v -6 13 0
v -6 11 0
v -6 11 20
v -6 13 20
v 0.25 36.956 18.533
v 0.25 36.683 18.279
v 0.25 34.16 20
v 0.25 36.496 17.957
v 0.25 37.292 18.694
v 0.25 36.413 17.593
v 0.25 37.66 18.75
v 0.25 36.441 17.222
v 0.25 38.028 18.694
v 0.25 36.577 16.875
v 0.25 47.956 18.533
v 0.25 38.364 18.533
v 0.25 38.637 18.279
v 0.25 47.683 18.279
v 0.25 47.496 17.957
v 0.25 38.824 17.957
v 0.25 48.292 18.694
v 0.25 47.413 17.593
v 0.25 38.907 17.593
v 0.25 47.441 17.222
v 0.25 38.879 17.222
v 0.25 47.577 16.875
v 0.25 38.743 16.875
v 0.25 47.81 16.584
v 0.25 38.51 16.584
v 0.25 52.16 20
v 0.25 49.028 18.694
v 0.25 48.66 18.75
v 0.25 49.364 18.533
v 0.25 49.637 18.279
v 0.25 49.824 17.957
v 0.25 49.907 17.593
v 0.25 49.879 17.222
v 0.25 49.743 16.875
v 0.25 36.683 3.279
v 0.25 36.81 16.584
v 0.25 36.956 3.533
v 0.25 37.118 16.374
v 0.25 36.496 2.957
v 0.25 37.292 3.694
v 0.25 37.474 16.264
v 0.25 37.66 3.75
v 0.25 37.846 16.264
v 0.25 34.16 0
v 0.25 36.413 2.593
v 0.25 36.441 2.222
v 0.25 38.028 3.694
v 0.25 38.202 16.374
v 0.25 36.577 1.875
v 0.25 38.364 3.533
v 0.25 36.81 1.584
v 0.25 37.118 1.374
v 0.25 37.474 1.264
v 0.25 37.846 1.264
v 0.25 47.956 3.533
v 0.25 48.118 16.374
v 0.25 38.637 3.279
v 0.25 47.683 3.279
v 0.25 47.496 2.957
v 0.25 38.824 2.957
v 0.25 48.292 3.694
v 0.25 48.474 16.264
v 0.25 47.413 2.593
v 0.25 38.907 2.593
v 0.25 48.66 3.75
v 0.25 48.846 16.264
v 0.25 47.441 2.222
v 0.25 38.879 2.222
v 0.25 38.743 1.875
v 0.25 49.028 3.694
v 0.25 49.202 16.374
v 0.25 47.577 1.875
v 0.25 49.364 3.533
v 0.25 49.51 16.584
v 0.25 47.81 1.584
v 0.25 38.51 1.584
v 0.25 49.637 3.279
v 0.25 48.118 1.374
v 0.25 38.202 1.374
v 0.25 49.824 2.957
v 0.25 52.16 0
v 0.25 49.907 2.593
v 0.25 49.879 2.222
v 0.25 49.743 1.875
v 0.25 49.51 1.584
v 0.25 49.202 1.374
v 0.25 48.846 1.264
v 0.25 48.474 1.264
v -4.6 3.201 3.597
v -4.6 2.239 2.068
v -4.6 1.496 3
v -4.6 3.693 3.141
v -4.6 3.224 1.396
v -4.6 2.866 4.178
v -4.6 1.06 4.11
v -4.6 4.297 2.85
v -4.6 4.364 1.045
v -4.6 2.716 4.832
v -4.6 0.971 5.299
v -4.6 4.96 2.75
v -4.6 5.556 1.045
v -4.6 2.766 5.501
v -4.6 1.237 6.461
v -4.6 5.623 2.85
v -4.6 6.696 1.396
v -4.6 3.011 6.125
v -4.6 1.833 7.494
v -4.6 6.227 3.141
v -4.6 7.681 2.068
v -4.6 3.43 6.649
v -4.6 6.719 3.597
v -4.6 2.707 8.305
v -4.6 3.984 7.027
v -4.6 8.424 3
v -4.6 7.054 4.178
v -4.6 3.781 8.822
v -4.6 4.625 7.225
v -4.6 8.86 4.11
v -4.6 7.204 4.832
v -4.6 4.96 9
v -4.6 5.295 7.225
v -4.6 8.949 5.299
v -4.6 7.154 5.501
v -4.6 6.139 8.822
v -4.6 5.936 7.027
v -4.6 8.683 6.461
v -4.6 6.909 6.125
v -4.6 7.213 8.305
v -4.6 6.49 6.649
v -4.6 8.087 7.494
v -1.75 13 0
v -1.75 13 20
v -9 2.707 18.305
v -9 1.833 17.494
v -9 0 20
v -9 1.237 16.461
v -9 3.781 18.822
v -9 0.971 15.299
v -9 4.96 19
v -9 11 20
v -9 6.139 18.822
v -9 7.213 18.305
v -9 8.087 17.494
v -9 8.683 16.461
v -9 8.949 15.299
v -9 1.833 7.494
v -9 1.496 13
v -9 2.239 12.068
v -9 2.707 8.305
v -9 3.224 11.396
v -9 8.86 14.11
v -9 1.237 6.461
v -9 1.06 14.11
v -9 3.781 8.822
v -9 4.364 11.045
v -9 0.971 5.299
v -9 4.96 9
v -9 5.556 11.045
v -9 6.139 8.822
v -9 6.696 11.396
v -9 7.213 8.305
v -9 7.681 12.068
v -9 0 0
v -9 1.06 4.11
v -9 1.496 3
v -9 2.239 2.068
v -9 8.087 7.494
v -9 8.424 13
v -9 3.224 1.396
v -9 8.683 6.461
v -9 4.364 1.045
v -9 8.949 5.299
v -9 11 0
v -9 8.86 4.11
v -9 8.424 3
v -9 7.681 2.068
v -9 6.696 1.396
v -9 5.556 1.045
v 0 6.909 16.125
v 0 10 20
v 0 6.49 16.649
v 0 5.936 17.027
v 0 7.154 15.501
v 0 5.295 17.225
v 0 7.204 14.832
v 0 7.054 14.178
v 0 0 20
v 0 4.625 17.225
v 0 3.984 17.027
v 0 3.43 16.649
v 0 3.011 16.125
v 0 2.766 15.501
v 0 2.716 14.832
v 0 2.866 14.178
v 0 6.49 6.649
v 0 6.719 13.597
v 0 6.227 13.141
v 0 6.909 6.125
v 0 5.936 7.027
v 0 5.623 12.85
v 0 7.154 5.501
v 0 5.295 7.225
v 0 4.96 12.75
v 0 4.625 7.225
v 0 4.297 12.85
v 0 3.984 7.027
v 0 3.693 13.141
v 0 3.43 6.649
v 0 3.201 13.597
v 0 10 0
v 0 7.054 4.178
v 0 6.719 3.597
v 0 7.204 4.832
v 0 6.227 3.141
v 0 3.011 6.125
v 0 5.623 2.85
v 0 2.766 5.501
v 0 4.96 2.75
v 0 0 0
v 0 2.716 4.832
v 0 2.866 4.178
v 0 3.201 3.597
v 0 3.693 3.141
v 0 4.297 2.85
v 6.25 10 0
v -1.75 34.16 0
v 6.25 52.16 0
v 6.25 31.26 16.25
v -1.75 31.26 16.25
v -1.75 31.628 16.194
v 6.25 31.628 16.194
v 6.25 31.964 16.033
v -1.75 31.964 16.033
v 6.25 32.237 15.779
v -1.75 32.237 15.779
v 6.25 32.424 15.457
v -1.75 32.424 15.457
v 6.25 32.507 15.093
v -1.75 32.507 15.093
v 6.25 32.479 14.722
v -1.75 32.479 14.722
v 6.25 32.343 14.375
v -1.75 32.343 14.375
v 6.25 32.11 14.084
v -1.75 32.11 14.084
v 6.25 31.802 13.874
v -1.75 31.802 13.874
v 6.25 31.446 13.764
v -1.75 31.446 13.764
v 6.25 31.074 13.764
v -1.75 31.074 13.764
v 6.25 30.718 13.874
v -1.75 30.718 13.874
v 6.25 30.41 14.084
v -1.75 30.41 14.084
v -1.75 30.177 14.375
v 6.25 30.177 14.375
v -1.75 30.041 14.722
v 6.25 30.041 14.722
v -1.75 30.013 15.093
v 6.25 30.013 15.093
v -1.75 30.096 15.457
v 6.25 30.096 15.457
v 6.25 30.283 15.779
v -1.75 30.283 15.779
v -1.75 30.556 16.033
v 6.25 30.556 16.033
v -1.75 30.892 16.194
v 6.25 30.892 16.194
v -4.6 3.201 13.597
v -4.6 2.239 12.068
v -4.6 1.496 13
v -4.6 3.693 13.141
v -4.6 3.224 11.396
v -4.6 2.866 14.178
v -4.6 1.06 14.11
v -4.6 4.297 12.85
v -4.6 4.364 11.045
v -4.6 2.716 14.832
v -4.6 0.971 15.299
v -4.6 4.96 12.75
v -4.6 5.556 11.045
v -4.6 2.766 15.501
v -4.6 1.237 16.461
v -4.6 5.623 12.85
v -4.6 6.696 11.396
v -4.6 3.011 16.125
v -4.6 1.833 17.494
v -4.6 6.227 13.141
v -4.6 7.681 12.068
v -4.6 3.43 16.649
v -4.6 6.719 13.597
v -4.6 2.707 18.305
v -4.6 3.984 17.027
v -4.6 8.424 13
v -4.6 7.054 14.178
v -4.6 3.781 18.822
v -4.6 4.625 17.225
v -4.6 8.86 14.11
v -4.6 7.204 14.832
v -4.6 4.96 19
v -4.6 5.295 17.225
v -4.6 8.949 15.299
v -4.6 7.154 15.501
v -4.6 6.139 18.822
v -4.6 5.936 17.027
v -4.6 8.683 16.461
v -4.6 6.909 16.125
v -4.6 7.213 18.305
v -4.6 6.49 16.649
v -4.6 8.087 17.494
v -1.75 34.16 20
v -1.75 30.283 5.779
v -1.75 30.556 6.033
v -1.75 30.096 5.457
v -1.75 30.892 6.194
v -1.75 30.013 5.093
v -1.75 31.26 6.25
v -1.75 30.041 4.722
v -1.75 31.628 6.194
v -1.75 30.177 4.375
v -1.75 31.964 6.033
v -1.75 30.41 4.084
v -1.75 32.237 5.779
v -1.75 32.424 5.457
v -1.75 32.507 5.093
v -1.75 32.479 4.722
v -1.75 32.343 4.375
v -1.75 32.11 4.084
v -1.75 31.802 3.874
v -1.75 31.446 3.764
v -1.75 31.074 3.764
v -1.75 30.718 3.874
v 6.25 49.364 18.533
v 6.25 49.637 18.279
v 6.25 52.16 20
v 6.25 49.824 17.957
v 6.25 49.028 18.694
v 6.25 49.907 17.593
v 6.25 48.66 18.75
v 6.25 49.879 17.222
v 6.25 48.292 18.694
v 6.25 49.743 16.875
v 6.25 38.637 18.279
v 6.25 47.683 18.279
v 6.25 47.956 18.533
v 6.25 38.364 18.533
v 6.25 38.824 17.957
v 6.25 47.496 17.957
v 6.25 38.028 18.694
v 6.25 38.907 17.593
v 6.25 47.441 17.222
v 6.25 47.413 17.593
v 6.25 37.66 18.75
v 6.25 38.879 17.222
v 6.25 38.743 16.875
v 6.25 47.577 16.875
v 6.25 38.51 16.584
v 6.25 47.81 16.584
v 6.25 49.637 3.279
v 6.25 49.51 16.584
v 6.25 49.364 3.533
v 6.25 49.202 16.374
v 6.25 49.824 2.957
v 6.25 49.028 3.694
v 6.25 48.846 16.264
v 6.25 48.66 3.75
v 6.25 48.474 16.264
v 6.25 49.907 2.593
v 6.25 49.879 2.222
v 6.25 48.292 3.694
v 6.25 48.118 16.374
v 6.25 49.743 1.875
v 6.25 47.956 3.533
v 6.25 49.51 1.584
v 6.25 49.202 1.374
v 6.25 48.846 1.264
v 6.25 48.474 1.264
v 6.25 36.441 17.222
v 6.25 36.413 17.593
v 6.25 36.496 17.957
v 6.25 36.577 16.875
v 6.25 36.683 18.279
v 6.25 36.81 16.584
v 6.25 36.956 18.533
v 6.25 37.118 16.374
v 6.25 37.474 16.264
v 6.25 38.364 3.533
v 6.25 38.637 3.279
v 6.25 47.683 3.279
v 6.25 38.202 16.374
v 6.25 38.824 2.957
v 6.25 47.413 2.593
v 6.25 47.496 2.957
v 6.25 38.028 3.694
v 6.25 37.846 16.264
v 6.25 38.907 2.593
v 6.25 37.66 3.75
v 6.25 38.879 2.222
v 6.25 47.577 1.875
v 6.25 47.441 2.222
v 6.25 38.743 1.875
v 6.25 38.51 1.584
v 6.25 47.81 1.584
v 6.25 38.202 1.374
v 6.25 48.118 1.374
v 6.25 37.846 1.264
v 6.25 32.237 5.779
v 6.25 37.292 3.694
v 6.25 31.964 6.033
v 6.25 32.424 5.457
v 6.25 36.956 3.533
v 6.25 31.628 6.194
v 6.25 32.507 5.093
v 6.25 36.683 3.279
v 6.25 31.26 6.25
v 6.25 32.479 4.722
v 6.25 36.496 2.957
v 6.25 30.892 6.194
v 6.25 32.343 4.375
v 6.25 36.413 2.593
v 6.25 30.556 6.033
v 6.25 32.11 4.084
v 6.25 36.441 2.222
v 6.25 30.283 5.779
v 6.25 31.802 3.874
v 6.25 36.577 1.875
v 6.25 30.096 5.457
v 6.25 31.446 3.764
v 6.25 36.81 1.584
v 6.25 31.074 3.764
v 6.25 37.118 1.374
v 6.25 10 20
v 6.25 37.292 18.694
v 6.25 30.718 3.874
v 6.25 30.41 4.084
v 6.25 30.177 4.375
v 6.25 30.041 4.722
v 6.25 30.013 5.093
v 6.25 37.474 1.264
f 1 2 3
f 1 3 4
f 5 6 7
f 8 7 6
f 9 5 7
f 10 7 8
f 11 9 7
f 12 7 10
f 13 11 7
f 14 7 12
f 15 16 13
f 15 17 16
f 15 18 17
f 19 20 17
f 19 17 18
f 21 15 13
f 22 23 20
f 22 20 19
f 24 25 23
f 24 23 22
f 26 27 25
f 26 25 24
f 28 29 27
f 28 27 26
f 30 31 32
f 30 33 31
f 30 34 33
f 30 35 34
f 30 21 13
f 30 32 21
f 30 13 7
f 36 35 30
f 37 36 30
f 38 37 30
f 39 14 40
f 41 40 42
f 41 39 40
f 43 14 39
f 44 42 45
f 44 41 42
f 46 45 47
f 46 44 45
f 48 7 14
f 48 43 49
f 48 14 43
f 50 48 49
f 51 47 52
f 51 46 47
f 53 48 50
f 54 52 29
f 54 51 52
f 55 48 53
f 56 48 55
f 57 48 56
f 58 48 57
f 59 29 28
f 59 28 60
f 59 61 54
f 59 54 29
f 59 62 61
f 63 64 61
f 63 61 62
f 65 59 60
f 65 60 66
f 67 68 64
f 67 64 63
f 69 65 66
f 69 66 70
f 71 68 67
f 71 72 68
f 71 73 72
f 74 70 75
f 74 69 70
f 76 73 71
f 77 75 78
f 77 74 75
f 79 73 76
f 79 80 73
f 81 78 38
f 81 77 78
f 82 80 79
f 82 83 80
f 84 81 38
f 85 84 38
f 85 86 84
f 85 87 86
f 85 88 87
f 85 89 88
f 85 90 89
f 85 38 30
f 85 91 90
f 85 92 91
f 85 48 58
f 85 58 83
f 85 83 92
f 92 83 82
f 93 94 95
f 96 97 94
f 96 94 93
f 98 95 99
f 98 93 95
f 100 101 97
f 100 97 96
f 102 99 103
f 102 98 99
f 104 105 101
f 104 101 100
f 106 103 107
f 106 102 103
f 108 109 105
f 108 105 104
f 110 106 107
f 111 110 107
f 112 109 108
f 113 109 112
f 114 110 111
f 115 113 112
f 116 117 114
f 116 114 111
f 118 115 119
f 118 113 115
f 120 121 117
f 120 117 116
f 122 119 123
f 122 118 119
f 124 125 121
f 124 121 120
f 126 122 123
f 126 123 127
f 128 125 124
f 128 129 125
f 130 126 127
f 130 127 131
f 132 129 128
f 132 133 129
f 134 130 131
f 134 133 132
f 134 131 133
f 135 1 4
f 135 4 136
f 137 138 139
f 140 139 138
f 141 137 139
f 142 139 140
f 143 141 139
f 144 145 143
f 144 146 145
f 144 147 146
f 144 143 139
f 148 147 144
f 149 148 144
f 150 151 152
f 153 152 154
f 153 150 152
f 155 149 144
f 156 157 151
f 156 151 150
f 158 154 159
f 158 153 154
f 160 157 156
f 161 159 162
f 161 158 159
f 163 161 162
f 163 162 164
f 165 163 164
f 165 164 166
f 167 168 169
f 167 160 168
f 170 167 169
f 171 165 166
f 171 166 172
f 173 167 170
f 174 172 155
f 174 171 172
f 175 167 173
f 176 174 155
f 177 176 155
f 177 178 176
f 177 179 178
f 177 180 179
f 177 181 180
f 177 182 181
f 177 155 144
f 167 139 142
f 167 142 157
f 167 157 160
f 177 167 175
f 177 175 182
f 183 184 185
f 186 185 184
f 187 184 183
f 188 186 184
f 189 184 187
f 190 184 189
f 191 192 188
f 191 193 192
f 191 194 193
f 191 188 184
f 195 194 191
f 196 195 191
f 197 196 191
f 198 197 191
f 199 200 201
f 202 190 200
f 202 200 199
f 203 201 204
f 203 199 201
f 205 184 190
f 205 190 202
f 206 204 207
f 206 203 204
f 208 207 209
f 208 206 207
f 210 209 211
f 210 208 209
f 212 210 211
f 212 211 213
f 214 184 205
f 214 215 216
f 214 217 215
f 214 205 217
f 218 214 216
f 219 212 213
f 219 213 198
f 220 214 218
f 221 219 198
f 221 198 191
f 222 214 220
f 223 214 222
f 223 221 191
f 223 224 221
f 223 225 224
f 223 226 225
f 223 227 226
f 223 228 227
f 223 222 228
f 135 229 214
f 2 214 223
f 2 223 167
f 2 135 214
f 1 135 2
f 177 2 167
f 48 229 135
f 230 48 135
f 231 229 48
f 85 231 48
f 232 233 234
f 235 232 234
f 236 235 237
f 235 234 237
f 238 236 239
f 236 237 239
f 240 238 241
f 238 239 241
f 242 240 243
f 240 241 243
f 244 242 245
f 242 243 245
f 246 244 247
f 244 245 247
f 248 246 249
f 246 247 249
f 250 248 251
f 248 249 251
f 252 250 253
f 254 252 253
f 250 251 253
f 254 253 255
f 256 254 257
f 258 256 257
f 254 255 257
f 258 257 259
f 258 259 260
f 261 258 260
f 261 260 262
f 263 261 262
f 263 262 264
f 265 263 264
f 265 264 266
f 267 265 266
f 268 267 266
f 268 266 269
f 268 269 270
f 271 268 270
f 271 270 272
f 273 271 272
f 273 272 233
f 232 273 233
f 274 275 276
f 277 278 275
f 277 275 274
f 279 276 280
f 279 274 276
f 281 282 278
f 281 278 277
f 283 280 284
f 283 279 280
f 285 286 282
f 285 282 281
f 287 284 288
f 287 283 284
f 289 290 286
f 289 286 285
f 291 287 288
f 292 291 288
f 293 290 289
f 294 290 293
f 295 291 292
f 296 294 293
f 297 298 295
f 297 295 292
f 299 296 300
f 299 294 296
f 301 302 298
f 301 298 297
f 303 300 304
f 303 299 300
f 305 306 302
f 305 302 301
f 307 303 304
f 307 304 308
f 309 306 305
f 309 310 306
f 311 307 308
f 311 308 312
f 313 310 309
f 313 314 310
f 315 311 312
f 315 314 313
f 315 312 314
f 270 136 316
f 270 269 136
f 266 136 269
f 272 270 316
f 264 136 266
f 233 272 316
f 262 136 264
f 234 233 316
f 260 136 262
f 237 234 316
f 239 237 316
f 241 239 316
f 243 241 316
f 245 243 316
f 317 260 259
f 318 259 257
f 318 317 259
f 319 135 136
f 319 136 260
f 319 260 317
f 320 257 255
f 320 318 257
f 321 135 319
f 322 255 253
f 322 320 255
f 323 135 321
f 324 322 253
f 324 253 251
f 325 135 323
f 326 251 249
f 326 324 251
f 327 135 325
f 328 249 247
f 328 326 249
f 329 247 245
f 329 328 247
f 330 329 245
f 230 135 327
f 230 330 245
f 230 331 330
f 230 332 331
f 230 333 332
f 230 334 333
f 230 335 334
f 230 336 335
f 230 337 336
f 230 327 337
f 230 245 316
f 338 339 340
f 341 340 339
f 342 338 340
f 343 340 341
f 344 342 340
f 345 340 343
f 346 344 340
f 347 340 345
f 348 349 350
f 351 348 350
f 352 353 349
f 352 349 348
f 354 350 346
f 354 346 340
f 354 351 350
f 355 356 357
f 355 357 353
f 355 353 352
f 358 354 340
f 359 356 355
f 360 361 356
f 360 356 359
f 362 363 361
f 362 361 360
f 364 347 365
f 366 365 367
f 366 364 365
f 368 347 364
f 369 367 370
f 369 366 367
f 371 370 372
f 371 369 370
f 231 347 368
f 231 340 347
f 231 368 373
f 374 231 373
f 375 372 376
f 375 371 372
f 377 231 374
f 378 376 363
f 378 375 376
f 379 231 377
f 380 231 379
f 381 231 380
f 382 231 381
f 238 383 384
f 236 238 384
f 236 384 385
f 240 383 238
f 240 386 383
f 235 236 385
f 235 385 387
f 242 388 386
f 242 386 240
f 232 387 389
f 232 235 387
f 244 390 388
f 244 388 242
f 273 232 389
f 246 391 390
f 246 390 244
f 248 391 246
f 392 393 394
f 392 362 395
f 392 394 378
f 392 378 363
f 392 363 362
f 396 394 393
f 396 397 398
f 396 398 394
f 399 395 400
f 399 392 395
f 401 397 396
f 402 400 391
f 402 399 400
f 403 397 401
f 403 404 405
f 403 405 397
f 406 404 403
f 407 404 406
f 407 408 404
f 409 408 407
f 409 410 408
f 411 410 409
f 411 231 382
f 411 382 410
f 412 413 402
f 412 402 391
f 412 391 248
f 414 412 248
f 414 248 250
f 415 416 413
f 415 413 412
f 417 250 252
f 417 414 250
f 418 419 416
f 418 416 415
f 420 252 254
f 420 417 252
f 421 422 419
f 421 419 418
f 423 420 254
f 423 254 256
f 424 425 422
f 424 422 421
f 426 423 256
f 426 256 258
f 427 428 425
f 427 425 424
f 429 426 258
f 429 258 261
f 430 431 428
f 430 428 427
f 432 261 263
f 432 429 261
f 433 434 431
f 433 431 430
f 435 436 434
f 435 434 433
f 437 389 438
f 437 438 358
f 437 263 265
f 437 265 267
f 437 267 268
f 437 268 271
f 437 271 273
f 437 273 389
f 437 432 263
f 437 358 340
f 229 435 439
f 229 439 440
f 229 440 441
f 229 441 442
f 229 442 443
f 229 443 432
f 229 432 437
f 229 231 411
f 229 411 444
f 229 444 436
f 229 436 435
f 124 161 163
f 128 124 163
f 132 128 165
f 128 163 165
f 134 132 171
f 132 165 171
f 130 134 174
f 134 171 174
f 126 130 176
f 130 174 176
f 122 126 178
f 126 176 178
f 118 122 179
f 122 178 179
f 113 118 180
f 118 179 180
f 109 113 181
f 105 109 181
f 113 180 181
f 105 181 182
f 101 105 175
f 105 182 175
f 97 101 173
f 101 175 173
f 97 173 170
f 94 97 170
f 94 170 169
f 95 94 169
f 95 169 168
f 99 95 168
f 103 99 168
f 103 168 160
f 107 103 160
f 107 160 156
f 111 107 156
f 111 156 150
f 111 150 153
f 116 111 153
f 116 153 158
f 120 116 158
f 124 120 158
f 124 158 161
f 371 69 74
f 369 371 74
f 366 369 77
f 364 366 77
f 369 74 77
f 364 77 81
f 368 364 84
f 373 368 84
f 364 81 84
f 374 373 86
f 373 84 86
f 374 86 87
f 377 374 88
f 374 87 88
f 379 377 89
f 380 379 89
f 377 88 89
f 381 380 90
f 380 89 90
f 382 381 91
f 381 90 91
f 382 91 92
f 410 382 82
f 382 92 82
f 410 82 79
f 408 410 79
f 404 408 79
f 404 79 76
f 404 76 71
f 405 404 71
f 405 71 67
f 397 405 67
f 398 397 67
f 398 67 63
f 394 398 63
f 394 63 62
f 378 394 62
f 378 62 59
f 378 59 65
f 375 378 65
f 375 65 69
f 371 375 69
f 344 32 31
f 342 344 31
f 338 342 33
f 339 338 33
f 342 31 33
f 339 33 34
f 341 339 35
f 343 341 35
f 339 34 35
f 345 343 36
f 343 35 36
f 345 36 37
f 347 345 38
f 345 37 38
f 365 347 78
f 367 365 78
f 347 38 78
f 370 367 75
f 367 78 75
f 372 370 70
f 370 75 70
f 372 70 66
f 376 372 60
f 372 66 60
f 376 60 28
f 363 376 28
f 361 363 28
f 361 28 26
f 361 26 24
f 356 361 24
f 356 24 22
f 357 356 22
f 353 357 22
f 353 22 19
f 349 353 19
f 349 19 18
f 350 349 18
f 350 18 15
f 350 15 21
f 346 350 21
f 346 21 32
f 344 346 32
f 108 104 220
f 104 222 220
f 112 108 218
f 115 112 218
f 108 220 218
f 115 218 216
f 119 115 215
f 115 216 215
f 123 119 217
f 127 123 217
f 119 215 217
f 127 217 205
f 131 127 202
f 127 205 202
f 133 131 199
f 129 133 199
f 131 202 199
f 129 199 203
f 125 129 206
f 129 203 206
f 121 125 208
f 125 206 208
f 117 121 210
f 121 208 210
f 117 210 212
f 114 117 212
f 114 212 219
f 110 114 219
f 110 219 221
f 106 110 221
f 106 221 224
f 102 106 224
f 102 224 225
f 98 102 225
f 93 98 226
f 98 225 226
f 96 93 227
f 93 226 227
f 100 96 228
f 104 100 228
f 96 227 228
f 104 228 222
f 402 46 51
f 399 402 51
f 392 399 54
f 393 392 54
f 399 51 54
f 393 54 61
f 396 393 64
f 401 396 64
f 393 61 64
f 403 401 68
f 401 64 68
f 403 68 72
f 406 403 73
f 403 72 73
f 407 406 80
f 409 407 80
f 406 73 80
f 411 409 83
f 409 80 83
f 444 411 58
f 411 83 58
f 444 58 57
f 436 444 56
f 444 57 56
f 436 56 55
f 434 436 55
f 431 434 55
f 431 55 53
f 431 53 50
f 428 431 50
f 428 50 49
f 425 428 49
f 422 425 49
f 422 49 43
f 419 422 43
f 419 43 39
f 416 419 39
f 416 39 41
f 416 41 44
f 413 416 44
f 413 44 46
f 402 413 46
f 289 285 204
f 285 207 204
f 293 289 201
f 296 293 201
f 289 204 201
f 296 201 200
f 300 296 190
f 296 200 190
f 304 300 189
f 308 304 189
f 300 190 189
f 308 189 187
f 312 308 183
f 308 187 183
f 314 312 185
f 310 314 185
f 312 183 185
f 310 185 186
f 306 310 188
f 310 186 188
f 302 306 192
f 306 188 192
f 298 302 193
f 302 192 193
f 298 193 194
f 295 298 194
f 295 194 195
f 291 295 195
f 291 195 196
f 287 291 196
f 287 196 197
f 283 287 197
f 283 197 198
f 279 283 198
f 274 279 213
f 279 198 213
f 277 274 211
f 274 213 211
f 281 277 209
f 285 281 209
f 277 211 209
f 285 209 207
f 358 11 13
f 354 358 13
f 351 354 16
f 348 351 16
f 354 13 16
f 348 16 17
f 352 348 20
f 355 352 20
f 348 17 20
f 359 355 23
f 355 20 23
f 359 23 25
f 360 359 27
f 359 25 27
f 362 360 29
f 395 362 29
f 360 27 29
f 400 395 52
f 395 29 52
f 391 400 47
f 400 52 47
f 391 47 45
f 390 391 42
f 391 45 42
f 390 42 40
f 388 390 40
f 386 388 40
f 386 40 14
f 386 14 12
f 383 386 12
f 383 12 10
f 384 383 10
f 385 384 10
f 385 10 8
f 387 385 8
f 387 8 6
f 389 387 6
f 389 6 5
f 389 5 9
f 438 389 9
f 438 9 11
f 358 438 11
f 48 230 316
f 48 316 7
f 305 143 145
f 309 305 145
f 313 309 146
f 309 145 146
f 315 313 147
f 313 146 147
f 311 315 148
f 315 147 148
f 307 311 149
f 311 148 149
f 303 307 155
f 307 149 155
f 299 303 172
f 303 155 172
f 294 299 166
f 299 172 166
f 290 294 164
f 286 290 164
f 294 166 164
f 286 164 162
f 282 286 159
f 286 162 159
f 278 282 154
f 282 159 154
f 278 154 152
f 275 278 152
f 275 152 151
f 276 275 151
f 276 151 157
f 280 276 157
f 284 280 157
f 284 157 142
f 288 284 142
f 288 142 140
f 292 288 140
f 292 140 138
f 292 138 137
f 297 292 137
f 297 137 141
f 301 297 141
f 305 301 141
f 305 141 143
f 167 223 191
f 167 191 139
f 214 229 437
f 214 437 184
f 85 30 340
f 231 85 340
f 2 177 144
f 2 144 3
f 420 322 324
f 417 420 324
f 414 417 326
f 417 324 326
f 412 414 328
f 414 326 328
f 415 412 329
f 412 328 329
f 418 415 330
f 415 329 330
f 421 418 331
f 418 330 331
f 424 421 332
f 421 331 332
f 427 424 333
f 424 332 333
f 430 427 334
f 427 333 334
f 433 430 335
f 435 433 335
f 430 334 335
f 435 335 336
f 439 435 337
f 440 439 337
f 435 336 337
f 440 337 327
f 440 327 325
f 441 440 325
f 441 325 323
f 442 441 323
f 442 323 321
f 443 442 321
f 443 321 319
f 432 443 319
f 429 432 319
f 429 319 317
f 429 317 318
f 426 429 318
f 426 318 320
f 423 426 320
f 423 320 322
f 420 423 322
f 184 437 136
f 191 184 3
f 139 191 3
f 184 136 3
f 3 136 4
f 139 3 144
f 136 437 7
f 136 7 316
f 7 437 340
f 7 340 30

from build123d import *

# Parameters (mm, degrees)
EXTRUDE_1_DEPTH              = 20
HOLE_WIZARD_M3_1_D           = 2.5
HOLE_WIZARD_M3_1_DEPTH       = 9.5
HOLE_WIZARD_M3_1_TIP         = 0.751075774
HOLE_WIZARD_M4_1_D           = 4.5
HOLE_WIZARD_M4_1_DEPTH       = 9.5
HOLE_WIZARD_M4_1_CBORE_D     = 8
HOLE_WIZARD_M4_1_CBORE_DEPTH = 4.4
HOLE_WIZARD_M4_1_TIP         = 1.351936393


with BuildPart() as part:
    # 草图1 → 凸台-拉伸1 (new body)
    with BuildSketch(Plane.XY):
        Polygon((-6, 13), (-1.75, 13), (-1.75, 34.16), (0.25, 34.16), (0.25, 52.16), (6.25, 52.16), (6.25, 10), (0, 10), (0, 0), (-9, 0), (-9, 11), (-6, 11), align=None)
    extrude(amount=EXTRUDE_1_DEPTH)

    # M3 螺纹孔1
    with Locations(Plane(origin=(6.25, 0, 0), x_dir=(0, 0, -1), z_dir=(1, 0, 0))):
        with Locations((-2.5, 48.66), (-2.5, 37.66), (-5, 31.26), (-15, 31.26), (-17.5, 37.66), (-17.5, 48.66)):
            Hole(HOLE_WIZARD_M3_1_D / 2, depth=HOLE_WIZARD_M3_1_DEPTH)
            with Locations((0, 0, -(HOLE_WIZARD_M3_1_DEPTH + HOLE_WIZARD_M3_1_TIP / 2))):  # 118° drill point
                Cone(0, HOLE_WIZARD_M3_1_D / 2, HOLE_WIZARD_M3_1_TIP, mode=Mode.SUBTRACT)

    # M4 六角凹头螺钉的柱形沉头孔1
    with Locations(Plane.ZY.offset(9)):
        with Locations((5, 4.96), (15, 4.96)):
            CounterBoreHole(HOLE_WIZARD_M4_1_D / 2, HOLE_WIZARD_M4_1_CBORE_D / 2, HOLE_WIZARD_M4_1_CBORE_DEPTH, depth=HOLE_WIZARD_M4_1_DEPTH)
            with Locations((0, 0, -(HOLE_WIZARD_M4_1_DEPTH + HOLE_WIZARD_M4_1_TIP / 2))):  # 118° drill point
                Cone(0, HOLE_WIZARD_M4_1_D / 2, HOLE_WIZARD_M4_1_TIP, mode=Mode.SUBTRACT)


solid = part.part
